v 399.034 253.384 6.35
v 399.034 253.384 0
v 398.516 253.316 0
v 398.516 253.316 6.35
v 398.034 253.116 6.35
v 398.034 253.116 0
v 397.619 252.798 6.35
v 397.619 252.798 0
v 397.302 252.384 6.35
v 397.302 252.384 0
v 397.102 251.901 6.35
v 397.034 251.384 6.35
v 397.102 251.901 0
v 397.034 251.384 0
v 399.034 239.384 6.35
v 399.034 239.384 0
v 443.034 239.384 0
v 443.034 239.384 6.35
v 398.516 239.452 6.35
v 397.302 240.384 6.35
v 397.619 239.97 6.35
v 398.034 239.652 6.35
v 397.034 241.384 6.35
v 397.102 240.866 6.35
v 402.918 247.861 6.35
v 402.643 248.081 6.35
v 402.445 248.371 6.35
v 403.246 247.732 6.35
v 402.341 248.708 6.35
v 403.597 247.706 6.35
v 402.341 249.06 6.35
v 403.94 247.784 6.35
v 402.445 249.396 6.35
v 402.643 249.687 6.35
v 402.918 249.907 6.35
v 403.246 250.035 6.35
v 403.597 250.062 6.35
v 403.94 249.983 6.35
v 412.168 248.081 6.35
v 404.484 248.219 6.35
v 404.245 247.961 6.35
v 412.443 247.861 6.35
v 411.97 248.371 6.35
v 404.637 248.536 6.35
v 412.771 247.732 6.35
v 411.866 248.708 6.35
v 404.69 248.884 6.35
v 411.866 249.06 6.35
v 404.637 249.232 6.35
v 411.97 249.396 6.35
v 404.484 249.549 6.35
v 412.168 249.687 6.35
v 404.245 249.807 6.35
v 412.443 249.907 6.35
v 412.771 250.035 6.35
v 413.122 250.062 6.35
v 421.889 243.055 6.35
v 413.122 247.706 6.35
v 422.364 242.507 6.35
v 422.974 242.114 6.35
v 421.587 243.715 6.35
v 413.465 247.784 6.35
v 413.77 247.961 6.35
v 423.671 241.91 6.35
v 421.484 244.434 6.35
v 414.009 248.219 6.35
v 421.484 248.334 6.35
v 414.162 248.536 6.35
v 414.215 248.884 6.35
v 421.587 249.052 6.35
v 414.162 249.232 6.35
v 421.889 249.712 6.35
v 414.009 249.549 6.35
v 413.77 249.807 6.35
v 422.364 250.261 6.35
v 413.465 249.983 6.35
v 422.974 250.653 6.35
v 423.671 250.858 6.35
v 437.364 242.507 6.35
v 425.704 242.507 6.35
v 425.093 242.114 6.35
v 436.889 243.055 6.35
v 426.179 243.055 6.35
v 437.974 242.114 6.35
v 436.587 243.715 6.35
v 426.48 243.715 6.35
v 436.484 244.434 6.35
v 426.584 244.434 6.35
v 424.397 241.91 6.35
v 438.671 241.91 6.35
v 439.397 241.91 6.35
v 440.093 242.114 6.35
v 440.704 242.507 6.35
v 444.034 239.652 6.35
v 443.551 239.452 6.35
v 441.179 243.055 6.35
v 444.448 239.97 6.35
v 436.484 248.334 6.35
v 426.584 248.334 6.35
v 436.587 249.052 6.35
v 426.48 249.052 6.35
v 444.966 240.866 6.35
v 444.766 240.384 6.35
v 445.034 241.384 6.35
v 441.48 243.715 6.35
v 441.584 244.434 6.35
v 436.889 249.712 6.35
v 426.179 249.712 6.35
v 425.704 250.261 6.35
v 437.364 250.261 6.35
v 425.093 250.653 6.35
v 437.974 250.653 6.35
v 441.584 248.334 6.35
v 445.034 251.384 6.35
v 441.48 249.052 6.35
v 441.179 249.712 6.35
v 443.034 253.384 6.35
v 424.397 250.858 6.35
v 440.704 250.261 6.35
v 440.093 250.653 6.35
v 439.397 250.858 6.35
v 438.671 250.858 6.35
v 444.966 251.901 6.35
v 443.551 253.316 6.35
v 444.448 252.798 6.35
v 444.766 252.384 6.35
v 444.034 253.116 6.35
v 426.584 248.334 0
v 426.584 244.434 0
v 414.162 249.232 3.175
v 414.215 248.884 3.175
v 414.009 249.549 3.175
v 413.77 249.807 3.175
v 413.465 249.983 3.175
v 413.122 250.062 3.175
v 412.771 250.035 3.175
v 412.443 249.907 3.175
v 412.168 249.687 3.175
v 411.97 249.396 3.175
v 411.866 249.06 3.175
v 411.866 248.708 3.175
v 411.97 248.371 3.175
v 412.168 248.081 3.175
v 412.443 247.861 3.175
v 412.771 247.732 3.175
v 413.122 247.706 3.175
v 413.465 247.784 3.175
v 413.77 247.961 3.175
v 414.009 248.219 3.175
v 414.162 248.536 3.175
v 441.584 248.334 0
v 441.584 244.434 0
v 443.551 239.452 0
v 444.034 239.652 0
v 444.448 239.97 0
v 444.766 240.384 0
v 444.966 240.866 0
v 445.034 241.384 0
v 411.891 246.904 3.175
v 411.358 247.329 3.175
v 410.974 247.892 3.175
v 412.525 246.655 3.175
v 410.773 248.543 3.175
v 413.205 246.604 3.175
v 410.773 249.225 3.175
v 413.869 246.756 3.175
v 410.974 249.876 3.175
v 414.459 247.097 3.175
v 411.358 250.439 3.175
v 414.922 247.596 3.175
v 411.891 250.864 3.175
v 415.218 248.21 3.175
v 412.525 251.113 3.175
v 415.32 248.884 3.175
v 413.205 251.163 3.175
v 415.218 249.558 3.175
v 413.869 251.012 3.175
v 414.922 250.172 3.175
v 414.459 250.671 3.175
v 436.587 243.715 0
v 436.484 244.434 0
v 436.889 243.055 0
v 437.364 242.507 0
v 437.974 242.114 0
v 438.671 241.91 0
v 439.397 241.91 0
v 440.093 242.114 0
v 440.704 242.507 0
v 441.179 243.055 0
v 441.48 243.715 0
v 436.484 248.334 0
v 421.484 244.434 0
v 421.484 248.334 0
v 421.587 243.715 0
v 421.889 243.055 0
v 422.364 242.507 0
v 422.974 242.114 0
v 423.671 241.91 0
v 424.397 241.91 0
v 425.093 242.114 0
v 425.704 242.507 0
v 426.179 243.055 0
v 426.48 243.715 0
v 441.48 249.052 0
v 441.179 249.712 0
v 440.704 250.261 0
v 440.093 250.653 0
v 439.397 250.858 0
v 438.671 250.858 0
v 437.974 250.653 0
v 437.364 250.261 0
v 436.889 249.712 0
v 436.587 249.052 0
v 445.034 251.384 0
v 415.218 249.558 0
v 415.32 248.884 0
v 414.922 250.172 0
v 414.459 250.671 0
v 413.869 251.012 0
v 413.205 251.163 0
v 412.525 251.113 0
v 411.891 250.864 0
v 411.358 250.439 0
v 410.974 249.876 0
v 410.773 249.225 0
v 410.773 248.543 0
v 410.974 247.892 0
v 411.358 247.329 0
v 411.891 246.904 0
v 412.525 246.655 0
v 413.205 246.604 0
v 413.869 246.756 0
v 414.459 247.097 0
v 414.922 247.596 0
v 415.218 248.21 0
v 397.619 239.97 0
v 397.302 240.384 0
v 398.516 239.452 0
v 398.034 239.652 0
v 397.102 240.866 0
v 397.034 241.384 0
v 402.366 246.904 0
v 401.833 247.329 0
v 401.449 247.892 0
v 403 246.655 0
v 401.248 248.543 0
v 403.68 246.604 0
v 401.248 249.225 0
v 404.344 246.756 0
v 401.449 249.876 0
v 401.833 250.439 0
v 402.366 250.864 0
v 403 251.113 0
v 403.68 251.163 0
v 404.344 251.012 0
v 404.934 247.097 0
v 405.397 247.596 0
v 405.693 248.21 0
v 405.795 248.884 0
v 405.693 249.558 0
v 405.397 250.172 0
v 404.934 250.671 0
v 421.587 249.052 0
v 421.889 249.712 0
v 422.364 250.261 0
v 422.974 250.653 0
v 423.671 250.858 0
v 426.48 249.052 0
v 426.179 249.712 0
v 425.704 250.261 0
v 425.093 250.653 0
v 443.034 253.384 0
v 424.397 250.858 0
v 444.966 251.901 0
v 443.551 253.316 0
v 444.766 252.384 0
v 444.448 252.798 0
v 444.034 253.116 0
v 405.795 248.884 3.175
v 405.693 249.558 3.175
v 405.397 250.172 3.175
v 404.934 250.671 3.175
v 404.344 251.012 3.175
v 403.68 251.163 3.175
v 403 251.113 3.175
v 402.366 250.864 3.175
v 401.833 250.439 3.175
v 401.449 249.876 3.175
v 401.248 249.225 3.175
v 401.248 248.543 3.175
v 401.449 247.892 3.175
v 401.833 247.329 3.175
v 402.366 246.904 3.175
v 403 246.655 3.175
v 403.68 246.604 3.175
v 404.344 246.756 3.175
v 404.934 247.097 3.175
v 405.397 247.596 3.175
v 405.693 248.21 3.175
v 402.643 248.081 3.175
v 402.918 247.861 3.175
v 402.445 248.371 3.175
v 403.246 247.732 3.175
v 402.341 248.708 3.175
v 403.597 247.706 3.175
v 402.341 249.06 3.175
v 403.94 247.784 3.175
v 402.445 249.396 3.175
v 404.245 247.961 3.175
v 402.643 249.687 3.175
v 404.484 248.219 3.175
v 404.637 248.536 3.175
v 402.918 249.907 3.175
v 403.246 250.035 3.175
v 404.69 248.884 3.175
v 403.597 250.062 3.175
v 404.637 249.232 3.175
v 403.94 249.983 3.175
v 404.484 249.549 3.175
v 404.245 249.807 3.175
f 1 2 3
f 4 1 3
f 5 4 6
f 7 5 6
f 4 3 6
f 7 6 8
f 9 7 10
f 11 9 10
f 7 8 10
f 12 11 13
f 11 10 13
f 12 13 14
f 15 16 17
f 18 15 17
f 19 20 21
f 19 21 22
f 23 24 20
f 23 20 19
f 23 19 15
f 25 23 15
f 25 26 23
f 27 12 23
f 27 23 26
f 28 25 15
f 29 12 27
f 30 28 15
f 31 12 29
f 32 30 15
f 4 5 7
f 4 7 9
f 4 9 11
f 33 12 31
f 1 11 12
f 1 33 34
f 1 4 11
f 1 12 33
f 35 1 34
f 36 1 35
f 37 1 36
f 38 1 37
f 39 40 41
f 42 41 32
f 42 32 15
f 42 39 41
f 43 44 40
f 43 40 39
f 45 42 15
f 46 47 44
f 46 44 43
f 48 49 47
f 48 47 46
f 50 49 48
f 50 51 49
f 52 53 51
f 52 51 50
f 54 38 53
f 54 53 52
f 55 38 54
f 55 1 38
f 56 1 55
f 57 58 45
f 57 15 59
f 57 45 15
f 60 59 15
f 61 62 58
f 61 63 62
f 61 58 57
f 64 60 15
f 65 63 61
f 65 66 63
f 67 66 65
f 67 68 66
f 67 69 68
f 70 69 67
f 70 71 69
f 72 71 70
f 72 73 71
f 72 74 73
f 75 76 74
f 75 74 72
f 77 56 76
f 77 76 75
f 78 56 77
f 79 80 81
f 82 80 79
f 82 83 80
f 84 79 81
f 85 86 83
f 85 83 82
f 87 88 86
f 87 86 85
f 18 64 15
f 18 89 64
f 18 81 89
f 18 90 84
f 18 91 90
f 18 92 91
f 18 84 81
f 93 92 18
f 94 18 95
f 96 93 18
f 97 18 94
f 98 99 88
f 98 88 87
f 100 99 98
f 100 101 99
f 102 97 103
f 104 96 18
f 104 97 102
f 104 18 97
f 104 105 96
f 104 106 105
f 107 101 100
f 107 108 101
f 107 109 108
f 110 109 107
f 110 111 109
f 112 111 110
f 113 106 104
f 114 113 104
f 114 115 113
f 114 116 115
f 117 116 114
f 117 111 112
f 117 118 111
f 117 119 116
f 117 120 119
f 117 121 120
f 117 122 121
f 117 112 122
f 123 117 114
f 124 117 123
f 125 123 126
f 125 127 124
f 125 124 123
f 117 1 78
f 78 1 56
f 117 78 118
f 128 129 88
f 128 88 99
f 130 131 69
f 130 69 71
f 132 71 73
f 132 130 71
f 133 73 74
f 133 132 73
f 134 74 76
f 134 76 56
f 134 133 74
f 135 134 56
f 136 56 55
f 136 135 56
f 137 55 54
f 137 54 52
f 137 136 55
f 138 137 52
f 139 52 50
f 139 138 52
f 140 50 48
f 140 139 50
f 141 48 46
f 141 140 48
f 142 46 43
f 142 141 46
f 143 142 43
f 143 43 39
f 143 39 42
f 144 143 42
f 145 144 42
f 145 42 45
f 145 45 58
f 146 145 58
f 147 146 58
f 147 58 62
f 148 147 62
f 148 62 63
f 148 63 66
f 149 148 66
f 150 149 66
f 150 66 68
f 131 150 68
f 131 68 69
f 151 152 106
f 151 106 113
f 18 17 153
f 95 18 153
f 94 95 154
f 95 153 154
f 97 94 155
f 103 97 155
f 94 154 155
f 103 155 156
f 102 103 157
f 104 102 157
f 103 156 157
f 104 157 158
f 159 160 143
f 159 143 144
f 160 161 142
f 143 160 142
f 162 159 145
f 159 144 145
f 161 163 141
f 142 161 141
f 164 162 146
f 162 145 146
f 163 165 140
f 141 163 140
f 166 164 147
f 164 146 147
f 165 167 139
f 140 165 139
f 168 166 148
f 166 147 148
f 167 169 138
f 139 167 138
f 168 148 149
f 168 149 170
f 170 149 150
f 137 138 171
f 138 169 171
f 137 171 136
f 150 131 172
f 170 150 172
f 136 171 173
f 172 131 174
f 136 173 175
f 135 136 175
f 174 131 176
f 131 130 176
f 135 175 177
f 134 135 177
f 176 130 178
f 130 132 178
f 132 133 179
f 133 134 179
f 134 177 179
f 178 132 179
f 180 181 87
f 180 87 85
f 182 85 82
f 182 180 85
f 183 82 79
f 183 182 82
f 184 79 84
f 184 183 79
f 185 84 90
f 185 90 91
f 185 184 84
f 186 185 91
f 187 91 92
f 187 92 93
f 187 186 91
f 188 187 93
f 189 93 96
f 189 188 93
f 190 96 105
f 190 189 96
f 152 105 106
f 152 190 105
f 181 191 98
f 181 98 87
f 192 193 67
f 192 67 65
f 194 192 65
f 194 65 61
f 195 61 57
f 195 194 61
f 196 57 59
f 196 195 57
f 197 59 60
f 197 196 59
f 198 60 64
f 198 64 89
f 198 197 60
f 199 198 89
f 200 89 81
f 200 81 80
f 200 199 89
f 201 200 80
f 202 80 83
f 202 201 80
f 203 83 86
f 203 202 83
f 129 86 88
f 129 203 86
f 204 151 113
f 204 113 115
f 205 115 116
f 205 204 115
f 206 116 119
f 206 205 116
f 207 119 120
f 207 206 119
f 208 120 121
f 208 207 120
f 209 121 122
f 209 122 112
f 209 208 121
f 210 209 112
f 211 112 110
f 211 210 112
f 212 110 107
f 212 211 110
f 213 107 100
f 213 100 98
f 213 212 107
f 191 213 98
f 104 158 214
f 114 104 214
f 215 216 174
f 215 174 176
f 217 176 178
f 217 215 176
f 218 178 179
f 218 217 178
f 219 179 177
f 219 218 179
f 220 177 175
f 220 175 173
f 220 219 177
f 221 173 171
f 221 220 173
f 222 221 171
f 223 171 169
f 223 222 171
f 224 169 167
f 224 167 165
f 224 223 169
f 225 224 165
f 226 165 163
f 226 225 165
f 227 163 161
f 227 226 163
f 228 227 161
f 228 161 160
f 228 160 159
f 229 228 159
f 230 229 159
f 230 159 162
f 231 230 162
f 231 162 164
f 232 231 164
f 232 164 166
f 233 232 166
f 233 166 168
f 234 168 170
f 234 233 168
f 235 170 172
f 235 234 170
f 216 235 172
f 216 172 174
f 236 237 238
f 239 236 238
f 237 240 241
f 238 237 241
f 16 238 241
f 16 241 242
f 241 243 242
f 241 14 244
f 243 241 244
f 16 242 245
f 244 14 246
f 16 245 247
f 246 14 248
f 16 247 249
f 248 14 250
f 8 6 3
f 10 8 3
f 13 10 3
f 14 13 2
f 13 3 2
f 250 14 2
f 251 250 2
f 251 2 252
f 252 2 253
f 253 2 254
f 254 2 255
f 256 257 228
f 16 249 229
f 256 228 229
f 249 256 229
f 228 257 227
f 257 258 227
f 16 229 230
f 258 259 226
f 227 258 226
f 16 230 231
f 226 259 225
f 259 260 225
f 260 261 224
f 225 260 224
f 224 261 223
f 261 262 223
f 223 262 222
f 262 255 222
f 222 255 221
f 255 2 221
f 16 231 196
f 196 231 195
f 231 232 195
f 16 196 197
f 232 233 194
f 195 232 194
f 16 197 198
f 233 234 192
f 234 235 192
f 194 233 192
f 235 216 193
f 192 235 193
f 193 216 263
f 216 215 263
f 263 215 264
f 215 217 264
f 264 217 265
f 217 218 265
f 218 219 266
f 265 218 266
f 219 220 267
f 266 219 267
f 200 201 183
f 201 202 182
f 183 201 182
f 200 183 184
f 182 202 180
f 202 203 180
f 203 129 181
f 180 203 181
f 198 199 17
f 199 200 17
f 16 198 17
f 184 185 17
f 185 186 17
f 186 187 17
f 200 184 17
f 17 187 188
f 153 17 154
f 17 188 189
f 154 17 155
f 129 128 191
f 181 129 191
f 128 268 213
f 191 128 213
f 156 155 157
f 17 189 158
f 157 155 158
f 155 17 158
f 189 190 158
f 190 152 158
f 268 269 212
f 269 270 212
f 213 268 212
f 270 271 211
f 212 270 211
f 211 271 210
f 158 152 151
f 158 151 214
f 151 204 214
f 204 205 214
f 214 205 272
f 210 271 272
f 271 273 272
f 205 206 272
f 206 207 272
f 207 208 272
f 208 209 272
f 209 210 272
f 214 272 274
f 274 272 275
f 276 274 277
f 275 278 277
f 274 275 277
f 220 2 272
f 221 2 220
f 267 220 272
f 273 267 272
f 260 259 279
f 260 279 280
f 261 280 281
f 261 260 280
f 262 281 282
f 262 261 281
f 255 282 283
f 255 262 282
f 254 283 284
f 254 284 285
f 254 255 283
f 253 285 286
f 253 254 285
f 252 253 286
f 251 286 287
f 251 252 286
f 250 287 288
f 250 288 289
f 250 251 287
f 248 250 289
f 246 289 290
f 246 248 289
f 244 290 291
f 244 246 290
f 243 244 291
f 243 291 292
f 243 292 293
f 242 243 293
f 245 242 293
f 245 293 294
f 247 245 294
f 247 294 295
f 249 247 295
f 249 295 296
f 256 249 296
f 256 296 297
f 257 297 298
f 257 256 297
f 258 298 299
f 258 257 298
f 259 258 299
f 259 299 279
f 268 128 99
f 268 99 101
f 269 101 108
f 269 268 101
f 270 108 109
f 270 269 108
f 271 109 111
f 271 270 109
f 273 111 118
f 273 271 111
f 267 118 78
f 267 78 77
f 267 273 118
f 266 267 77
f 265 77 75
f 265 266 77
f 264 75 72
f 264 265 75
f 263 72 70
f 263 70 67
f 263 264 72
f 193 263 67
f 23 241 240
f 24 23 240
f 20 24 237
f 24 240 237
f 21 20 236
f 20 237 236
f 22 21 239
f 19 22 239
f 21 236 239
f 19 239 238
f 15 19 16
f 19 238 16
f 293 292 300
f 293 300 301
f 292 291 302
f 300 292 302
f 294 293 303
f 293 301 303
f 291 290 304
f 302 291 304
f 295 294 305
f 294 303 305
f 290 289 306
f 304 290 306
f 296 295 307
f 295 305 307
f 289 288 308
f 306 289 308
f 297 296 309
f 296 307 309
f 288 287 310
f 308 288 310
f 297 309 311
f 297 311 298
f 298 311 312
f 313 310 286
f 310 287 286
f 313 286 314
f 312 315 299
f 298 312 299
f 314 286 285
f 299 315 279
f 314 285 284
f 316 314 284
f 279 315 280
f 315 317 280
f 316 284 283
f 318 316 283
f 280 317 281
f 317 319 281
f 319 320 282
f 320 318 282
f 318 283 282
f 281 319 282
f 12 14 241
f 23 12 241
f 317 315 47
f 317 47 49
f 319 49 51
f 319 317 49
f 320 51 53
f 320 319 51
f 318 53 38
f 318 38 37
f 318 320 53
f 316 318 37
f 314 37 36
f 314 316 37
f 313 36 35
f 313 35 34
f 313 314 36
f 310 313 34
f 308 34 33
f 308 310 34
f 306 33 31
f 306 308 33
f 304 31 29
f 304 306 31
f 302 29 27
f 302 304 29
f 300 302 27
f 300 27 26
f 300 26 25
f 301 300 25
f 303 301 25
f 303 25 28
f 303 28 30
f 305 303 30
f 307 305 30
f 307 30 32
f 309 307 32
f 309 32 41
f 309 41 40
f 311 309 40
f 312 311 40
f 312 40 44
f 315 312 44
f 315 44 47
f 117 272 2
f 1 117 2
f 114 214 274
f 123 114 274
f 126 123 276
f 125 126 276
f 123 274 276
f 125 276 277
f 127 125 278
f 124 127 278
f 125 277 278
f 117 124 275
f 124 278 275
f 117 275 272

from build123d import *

# Parameters (mm, degrees)
SKETCH1_R           = 1.181
BOSS_EXTRUDE1_DEPTH = 6.35
SKETCH1_3_R         = 2.286
SKETCH1_3_R_2       = 1.181
CUT_EXTRUDE1_DEPTH  = 3.175


with BuildPart() as part:
    # Sketch1 → Boss-Extrude1 (new body)
    with BuildSketch(Plane.XY):
        with BuildLine():
            ThreePointArc((397.033701588, 241.383854224), (397.619488025, 239.969640661), (399.033701588, 239.383854223))
            Line((399.033701588, 239.383854223), (443.033701589, 239.383854223))
            ThreePointArc((443.033701589, 239.383854223), (444.447915151, 239.969640661), (445.033701588, 241.383854223))
            Line((445.033701588, 241.383854223), (445.033701588, 251.383854223))
            ThreePointArc((445.033701588, 251.383854223), (444.447915152, 252.798067786), (443.033701589, 253.383854224))
            Line((443.033701589, 253.383854224), (399.033701588, 253.383854224))
            ThreePointArc((399.033701588, 253.383854224), (397.619488025, 252.798067787), (397.033701588, 251.383854224))
            Line((397.033701588, 251.383854224), (397.033701588, 241.383854224))
        make_face()
        with BuildLine():
            Line((421.483701588, 244.433854222), (421.483701588, 248.333854223))
            ThreePointArc((421.483701588, 248.333854223), (424.033701588, 250.883854223), (426.583701588, 248.333854223))
            Line((426.583701588, 248.333854223), (426.583701588, 244.433854222))
            ThreePointArc((426.583701588, 244.433854222), (424.033701588, 241.883854222), (421.483701588, 244.433854222))
        make_face(mode=Mode.SUBTRACT)
        with BuildLine():
            Line((436.483701588, 244.433854222), (436.483701588, 248.333854223))
            ThreePointArc((436.483701588, 248.333854223), (439.033701588, 250.883854223), (441.583701588, 248.333854223))
            Line((441.583701588, 248.333854223), (441.583701588, 244.433854222))
            ThreePointArc((441.583701588, 244.433854222), (439.033701588, 241.883854222), (436.483701588, 244.433854222))
        make_face(mode=Mode.SUBTRACT)
        with Locations((403.508701589, 248.883854223)):
            Circle(SKETCH1_R, mode=Mode.SUBTRACT)
        with Locations((413.033701589, 248.883854223)):
            Circle(SKETCH1_R, mode=Mode.SUBTRACT)
    extrude(amount=BOSS_EXTRUDE1_DEPTH)

    # Sketch1<3> → Cut-Extrude1 (cut)
    # profile 1 of 2: a face of its own
    with BuildSketch(Plane.XY):
        with Locations((403.508701589, 248.883854223)):
            Circle(SKETCH1_3_R)
        with Locations((403.508701589, 248.883854223)):
            Circle(SKETCH1_3_R_2, mode=Mode.SUBTRACT)
    # profile 2 of 2: a face of its own
    with BuildSketch(Plane.XY):
        with Locations((413.033701589, 248.883854223)):
            Circle(SKETCH1_3_R)
        with Locations((413.033701589, 248.883854223)):
            Circle(SKETCH1_3_R_2, mode=Mode.SUBTRACT)
    extrude(amount=CUT_EXTRUDE1_DEPTH, mode=Mode.SUBTRACT)


solid = part.part
